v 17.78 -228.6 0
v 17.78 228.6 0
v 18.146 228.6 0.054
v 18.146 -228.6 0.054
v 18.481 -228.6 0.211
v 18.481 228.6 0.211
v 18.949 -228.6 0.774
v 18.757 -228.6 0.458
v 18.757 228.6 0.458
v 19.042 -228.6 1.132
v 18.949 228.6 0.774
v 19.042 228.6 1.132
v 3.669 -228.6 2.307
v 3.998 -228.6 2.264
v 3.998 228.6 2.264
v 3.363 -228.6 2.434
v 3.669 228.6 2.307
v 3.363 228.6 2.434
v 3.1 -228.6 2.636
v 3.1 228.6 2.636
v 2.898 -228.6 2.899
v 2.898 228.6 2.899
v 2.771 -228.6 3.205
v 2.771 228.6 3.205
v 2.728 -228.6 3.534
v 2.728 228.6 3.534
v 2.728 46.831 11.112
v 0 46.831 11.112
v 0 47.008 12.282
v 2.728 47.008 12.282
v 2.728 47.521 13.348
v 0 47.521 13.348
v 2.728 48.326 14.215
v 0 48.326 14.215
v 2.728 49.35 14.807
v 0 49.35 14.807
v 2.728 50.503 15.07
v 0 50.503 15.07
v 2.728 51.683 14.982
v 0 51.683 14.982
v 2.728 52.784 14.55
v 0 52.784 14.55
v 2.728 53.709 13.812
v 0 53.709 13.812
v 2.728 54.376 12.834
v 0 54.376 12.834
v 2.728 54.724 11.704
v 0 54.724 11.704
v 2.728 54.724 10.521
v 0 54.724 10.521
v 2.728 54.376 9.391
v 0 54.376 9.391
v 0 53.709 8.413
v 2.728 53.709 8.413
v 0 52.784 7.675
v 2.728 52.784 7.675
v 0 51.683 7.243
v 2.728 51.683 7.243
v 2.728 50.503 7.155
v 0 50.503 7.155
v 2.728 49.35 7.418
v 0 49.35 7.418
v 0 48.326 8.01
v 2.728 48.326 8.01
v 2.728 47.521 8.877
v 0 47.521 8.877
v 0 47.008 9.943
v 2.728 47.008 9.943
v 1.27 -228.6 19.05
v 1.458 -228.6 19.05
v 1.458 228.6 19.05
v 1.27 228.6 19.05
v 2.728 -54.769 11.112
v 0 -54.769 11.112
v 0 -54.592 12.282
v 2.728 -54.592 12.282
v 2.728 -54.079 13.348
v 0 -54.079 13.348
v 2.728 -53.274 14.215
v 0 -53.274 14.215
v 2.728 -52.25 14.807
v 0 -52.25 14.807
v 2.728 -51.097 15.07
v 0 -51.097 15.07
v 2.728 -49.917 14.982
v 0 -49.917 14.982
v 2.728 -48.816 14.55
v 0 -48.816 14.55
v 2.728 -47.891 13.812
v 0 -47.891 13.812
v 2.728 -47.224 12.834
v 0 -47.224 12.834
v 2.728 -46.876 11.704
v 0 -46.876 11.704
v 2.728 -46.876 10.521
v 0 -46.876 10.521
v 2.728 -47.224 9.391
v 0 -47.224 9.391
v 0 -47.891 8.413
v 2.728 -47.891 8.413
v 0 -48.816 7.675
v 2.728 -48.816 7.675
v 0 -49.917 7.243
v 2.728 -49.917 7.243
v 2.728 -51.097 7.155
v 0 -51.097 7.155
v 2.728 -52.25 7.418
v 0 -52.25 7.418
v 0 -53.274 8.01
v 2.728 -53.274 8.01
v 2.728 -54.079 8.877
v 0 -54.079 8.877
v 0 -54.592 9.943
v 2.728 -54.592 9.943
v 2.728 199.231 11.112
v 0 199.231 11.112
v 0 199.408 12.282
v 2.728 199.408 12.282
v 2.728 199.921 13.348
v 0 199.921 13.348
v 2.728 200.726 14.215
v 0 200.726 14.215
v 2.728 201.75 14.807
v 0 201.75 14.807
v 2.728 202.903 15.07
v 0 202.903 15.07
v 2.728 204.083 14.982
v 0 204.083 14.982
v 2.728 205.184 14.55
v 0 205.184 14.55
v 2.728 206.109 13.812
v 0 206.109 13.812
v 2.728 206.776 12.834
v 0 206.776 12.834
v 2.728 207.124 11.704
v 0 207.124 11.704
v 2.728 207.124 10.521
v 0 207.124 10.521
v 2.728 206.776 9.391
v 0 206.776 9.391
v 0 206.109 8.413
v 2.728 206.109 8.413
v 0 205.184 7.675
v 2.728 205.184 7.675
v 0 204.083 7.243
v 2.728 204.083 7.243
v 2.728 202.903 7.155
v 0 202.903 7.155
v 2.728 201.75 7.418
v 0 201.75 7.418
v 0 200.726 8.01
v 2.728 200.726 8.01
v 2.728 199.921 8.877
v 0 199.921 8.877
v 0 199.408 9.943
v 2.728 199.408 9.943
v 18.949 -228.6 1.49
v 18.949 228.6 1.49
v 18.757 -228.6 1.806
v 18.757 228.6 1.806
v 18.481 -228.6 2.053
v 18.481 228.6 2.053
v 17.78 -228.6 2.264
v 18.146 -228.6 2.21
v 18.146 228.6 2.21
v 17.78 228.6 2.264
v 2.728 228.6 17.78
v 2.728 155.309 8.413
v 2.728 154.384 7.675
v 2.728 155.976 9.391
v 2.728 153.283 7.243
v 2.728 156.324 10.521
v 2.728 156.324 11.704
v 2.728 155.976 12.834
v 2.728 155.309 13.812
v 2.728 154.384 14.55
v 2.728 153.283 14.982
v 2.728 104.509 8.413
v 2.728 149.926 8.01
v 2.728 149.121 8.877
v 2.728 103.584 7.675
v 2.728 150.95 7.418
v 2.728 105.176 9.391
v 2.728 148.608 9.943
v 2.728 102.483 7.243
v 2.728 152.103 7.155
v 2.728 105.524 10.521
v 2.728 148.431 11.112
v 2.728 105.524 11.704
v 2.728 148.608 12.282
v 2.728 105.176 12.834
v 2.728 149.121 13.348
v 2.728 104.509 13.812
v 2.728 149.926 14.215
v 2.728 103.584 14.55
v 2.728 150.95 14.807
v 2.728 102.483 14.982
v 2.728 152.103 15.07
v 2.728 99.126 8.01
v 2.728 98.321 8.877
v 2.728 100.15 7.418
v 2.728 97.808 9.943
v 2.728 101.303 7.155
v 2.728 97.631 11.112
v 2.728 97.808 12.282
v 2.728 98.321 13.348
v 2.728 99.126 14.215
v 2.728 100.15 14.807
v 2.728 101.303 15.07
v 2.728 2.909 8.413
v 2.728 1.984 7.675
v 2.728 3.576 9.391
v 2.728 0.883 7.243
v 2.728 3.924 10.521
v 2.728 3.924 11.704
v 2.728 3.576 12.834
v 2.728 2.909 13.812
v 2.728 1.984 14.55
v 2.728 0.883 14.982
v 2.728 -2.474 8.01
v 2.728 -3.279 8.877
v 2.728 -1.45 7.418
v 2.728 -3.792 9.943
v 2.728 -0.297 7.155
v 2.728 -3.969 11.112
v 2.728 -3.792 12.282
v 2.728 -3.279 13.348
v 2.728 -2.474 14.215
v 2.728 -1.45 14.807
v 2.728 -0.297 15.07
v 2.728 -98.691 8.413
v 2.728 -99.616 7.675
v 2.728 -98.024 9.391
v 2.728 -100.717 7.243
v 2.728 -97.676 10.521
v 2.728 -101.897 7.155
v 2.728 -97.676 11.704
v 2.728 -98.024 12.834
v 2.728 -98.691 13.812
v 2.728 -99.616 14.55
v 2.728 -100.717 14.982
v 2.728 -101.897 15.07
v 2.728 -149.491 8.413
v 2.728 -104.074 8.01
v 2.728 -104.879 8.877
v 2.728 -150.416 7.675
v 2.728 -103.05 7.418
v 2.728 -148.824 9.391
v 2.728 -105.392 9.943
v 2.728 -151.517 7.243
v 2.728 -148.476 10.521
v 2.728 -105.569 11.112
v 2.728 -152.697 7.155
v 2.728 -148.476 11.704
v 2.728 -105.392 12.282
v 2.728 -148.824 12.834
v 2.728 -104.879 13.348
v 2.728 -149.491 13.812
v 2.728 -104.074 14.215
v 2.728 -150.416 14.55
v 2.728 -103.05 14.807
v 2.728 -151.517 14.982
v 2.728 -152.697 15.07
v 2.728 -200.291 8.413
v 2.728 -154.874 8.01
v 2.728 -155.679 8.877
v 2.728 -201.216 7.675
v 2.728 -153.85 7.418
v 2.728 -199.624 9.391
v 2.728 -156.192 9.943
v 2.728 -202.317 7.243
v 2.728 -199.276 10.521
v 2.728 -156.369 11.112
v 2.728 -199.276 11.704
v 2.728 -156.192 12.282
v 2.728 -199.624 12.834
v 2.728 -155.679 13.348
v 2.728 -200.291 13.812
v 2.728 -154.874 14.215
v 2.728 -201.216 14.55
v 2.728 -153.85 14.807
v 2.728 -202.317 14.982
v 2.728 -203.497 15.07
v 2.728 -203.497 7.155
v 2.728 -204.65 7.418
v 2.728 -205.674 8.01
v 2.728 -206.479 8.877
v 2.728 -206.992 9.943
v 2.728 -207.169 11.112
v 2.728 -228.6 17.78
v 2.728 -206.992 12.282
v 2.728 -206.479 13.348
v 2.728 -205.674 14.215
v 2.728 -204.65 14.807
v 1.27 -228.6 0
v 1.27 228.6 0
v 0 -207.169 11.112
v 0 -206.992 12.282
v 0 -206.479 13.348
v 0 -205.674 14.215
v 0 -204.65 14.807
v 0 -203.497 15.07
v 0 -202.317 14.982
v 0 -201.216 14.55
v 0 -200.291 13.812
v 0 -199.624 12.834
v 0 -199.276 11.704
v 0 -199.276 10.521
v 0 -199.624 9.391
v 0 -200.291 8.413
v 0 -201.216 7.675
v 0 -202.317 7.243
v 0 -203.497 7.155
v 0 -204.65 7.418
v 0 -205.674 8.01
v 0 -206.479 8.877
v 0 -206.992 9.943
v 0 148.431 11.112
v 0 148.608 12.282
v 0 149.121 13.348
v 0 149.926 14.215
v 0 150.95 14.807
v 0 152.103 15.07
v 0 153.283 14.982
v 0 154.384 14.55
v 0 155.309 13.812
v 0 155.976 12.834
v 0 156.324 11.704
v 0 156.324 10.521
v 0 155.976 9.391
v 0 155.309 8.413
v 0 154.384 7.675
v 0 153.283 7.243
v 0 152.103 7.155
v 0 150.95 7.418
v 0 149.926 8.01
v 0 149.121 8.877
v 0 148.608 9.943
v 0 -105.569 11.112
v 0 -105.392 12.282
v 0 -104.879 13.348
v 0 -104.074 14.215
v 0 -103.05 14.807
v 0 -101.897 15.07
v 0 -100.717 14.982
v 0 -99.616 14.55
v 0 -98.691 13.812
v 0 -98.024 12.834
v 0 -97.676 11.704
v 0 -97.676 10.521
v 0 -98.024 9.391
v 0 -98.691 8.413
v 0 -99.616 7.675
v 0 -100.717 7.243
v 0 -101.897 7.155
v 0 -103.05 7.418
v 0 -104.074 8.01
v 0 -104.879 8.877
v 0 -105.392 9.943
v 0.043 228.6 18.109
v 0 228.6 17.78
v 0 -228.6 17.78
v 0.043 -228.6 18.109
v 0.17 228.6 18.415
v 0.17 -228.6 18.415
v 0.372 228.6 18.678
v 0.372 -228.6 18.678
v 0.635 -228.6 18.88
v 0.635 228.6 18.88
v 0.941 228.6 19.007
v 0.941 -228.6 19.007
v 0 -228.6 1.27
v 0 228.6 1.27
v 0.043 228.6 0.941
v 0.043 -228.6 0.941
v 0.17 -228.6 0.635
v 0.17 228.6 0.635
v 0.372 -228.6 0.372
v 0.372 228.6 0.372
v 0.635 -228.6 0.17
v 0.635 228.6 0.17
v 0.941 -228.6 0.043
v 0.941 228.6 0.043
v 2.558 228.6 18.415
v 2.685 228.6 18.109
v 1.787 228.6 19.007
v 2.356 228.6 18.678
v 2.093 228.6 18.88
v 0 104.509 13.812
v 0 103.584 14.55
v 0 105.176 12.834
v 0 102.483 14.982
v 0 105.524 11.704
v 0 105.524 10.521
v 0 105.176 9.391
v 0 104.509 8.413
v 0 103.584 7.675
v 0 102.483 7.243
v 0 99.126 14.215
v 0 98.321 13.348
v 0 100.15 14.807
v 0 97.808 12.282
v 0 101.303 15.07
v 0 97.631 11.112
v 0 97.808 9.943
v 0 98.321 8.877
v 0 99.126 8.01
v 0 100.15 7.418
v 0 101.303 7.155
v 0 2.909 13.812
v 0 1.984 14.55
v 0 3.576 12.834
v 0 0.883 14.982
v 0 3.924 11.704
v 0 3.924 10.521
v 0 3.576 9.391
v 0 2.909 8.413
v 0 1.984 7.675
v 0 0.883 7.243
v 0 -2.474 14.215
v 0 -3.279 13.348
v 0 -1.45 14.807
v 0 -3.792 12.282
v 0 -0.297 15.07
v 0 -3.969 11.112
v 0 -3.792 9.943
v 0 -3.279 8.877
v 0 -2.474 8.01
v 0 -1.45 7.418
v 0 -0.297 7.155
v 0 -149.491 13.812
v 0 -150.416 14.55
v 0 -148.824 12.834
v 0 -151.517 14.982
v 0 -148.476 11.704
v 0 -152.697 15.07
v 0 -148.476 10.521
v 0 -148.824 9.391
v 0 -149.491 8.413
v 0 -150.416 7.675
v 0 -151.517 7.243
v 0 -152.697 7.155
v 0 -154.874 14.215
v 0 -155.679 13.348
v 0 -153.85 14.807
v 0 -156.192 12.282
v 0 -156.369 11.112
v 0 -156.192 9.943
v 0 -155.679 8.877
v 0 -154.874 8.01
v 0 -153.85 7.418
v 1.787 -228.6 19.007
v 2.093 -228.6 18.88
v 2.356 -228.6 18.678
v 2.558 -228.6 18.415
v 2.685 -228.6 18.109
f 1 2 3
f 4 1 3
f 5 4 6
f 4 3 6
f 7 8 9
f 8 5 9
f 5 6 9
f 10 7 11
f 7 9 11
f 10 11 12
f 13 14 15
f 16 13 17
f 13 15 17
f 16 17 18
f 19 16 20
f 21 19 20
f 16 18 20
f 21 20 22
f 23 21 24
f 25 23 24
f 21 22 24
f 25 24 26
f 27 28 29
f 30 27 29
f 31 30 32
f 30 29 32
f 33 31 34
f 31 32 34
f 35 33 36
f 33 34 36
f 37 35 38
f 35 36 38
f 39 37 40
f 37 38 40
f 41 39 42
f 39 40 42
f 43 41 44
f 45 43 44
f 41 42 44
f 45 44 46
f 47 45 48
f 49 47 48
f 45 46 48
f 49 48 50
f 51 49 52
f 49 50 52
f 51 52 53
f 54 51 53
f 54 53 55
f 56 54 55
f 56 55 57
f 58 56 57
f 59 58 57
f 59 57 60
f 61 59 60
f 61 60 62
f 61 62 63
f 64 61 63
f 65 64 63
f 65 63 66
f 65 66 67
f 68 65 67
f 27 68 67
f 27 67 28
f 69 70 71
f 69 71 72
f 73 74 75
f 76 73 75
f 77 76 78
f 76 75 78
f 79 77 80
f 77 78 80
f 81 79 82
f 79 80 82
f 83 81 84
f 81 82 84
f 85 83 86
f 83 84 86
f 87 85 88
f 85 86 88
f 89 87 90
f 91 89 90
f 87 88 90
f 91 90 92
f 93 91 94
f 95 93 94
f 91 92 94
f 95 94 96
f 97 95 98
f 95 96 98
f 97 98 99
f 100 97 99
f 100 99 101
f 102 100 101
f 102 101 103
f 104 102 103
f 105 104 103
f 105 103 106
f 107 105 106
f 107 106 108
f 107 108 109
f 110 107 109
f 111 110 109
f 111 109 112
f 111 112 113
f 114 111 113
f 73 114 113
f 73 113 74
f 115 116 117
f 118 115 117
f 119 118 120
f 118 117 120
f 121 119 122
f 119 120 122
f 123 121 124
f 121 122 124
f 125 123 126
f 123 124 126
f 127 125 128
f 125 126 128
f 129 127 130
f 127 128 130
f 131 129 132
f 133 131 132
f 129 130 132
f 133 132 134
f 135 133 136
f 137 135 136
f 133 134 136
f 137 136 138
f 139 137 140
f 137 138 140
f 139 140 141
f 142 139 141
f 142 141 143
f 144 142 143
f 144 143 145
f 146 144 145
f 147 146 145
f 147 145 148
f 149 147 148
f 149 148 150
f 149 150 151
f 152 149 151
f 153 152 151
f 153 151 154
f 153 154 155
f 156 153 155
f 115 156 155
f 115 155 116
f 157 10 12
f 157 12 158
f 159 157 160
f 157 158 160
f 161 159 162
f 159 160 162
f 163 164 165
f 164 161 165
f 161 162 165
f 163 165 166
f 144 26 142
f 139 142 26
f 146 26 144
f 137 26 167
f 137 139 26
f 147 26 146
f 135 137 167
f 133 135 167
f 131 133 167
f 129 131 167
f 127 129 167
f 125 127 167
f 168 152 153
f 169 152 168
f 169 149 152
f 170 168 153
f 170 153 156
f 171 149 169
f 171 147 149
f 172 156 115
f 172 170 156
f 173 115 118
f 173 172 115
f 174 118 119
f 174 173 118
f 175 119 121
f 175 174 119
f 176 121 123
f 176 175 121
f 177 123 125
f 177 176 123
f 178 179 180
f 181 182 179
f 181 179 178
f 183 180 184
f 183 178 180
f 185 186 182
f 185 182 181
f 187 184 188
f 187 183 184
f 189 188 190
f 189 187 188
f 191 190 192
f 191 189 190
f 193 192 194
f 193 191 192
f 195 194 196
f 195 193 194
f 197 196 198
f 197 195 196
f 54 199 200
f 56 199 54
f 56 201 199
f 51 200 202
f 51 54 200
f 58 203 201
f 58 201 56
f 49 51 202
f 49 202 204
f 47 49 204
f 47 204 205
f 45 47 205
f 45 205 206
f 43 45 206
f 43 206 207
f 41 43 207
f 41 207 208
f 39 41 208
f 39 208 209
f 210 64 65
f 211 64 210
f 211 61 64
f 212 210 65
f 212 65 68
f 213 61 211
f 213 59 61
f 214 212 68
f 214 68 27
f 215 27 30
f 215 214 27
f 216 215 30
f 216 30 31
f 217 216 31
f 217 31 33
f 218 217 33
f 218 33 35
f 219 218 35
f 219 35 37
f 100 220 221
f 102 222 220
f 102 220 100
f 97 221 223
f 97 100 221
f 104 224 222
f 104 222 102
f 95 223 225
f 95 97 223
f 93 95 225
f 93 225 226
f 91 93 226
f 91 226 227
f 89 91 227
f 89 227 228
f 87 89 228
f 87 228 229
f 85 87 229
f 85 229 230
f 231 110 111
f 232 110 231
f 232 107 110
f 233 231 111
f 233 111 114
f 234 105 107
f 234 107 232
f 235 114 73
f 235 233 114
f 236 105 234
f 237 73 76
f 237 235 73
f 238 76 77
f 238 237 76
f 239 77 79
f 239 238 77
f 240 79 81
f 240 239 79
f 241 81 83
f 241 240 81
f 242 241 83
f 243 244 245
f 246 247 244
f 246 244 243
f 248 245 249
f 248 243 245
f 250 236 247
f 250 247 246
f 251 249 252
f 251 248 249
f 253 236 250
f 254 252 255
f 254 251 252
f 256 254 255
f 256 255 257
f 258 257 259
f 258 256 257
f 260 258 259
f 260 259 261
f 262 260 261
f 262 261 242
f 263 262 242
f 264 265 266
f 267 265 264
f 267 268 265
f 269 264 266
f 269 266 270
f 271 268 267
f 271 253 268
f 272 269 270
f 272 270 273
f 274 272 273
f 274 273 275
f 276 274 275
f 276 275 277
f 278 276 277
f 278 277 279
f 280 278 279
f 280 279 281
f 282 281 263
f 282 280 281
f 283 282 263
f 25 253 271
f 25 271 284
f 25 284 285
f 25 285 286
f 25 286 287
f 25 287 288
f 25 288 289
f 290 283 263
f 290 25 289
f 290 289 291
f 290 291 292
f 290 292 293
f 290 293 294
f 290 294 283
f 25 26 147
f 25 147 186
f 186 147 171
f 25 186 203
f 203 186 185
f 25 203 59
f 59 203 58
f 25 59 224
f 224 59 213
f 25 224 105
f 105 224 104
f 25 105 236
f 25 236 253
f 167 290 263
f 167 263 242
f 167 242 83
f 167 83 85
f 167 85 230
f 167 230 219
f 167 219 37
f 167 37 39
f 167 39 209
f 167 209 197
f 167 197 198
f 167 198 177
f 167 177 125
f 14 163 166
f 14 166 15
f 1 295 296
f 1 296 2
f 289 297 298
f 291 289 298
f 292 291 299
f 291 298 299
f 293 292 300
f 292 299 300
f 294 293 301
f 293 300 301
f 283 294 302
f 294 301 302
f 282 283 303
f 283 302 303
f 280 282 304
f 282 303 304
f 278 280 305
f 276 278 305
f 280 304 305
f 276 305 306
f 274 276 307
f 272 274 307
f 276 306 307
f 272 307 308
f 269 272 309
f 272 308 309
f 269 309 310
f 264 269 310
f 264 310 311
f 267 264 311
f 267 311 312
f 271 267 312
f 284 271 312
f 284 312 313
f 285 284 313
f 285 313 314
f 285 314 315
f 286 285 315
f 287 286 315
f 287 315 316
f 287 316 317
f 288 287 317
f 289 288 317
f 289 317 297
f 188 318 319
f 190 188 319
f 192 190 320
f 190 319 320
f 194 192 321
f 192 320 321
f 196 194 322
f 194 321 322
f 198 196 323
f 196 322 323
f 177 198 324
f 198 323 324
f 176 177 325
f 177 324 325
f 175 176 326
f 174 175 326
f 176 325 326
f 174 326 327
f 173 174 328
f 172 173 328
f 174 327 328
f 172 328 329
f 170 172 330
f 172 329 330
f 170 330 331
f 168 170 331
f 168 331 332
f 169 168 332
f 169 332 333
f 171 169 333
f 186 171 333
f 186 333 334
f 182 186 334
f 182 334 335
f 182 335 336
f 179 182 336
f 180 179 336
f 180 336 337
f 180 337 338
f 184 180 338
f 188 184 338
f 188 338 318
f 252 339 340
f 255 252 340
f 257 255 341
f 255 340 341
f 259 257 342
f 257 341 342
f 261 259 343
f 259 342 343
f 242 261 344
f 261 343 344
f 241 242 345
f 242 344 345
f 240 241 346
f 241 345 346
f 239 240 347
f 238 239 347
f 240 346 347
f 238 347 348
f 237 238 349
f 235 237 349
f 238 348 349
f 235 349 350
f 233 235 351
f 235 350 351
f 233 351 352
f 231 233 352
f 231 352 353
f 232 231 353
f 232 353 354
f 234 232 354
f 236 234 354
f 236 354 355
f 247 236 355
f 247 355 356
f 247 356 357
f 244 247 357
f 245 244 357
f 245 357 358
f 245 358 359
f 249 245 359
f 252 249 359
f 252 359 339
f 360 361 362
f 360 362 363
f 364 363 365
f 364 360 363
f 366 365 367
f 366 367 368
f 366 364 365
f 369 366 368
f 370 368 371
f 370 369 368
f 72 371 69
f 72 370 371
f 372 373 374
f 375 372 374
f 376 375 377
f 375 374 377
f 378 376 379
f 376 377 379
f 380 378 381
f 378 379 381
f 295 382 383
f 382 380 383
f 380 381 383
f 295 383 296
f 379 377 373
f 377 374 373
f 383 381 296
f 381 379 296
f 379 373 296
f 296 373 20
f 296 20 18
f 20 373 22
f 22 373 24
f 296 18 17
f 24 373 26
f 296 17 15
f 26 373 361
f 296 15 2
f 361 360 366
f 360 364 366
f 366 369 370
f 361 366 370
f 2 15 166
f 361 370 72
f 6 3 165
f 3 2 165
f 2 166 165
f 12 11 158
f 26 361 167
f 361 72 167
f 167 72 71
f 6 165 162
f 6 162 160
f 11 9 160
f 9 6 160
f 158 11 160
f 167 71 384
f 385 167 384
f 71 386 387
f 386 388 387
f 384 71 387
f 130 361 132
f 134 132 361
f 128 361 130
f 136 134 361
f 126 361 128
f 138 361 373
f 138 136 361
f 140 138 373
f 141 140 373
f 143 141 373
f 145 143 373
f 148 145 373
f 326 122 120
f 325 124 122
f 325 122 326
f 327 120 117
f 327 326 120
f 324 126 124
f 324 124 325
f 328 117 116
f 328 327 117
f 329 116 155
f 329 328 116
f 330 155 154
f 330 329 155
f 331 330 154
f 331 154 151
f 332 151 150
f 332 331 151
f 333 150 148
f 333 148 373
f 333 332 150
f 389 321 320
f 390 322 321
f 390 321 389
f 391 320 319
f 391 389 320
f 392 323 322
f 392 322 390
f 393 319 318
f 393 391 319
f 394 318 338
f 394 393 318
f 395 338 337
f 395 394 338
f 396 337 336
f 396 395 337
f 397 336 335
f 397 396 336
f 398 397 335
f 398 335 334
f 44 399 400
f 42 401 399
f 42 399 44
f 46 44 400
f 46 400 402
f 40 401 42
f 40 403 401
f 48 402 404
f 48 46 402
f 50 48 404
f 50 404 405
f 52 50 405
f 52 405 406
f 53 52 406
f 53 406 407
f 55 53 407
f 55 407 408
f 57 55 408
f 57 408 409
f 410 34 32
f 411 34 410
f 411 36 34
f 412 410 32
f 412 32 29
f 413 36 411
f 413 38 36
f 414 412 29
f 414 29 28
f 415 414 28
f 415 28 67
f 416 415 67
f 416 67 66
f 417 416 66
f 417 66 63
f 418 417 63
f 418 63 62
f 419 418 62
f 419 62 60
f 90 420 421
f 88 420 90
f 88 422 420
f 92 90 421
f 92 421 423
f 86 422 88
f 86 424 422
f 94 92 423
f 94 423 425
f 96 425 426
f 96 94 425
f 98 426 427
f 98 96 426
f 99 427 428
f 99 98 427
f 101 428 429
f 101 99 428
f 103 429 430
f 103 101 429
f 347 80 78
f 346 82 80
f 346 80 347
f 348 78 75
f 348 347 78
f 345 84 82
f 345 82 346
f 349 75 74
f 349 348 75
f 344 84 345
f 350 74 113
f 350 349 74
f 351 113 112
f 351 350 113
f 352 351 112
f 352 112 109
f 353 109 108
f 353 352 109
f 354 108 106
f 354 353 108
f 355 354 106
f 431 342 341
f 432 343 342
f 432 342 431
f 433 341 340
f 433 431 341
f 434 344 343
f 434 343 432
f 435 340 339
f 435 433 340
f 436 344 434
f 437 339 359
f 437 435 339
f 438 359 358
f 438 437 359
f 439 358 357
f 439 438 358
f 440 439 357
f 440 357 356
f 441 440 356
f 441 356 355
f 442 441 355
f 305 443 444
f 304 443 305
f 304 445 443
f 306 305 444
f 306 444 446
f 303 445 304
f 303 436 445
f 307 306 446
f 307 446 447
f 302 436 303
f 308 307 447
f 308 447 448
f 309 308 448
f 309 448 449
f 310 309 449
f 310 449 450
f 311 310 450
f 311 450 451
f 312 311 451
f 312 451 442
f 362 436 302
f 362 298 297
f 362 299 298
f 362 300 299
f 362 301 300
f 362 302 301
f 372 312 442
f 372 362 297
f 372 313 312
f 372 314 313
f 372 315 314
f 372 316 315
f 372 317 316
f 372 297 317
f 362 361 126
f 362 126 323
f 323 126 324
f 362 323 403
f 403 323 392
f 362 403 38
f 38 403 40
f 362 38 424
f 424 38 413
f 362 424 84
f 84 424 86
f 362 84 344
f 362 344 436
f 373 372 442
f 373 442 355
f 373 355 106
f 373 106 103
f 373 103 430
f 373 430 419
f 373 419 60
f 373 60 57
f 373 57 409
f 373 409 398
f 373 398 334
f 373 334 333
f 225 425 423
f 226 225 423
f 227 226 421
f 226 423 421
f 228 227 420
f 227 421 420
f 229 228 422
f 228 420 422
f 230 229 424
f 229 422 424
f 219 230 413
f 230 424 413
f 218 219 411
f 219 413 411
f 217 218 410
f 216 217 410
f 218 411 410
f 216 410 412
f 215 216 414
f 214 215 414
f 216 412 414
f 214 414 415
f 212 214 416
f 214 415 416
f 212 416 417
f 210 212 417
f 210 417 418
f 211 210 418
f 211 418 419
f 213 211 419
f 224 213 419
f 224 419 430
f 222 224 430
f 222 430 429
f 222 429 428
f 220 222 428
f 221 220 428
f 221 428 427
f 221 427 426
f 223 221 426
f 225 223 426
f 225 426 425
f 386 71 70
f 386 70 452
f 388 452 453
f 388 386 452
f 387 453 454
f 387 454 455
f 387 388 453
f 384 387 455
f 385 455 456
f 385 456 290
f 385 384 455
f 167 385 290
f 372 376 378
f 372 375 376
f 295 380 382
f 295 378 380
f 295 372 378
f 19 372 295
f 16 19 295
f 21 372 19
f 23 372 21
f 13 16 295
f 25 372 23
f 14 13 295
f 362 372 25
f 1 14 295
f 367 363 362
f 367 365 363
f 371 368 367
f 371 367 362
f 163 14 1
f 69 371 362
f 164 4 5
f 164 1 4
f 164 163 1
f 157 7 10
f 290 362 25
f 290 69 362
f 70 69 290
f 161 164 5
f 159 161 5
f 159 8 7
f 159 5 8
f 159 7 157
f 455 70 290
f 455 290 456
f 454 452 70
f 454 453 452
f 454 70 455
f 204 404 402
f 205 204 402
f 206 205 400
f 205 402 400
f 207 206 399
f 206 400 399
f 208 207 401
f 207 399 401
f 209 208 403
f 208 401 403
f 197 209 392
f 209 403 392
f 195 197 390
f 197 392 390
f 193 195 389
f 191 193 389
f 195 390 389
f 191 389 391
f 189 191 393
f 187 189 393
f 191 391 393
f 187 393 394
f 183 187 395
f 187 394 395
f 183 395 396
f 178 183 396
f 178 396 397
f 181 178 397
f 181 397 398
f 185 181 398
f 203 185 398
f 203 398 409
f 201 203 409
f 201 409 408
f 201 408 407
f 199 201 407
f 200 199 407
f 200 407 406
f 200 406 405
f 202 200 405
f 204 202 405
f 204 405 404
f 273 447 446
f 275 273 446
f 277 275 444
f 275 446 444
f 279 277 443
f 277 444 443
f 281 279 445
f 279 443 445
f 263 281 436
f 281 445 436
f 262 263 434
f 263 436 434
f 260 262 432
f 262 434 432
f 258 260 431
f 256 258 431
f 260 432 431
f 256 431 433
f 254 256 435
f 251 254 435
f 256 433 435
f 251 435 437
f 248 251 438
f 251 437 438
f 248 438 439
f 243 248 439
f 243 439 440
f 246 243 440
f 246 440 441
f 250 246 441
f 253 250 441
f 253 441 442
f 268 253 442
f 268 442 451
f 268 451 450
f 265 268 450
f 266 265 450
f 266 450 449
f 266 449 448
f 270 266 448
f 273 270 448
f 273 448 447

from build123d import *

# Parameters (mm, degrees)
F1_DEPTH    = 228.6
F3_D        = 7.9375
F4_T1_DEPTH = 457.2
F4_T3_DEPTH = 463.55


# Not quite as in the source:
# - a fillet or chamfer that OpenCascade refuses, or shapes differently, is made with other operations: its cross-section is extruded or revolved along the edge and cut away or added


with BuildPart() as f1:
    # F0 (on Front) → F1 (new body, symmetric)
    with BuildSketch(Plane.XZ):
        Polygon((0, 2.264165209), (0, 0), (2.7281190167, 0), (19.05, 0), (19.05, 2.264165209), (2.7281190167, 2.264165209), (2.7281190167, 19.05), (0, 19.05), align=None)
    extrude(amount=F1_DEPTH, both=True)

    # F3 (through all)
    with Locations(Plane.YZ.offset(2.7281190167)):
        with Locations((-203.2, 11.1125), (-152.4, 11.1125), (-101.6, 11.1125), (-50.8, 11.1125), (101.6, 11.1125), (50.8, 11.1125), (0, 11.1125), (152.4, 11.1125), (203.2, 11.1125)):
            Hole(F3_D / 2)

    # F4: fillet of radius 1.27 on 6 edges, made by hand

    # F4_s2 → F4_t1 (join)
    with BuildSketch(Plane.XZ.offset(-228.6)):
        with BuildLine():
            ThreePointArc((3.9981190167, 2.264165209), (3.1000934046, 2.6361395969), (2.7281190167, 3.534165209))
            Line((2.7281190167, 3.534165209), (2.7281190167, 2.264165209))
            Line((2.7281190167, 2.264165209), (3.9981190167, 2.264165209))
        make_face()
    extrude(amount=F4_T1_DEPTH)

    # F4_s4 → F4_t3 (cut)
    with BuildSketch(Plane.XZ.offset(-231.775)):
        with BuildLine():
            ThreePointArc((0, 17.78), (0.3719743879, 18.6780256121), (1.27, 19.05))
            Line((1.27, 19.05), (0, 19.05))
            Line((0, 19.05), (0, 17.78))
        make_face()
        with BuildLine():
            ThreePointArc((1.4581190167, 19.05), (2.3561446288, 18.6780256121), (2.7281190167, 17.78))
            Line((2.7281190167, 17.78), (2.7281190167, 19.05))
            Line((2.7281190167, 19.05), (1.4581190167, 19.05))
        make_face()
        with BuildLine():
            ThreePointArc((19.05, 0.994165209), (18.6780256121, 1.8921908211), (17.78, 2.264165209))
            Line((17.78, 2.264165209), (19.05, 2.264165209))
            Line((19.05, 2.264165209), (19.05, 0.994165209))
        make_face()
        with BuildLine():
            ThreePointArc((17.78, 0), (18.6780256121, 0.3719743879), (19.05, 1.27))
            Line((19.05, 1.27), (19.05, 0))
            Line((19.05, 0), (17.78, 0))
        make_face()
        with BuildLine():
            ThreePointArc((0, 1.27), (0.3719743879, 0.3719743879), (1.27, 0))
            Line((1.27, 0), (0, 0))
            Line((0, 0), (0, 1.27))
        make_face()
    extrude(amount=F4_T3_DEPTH, mode=Mode.SUBTRACT)


solid = f1.part
